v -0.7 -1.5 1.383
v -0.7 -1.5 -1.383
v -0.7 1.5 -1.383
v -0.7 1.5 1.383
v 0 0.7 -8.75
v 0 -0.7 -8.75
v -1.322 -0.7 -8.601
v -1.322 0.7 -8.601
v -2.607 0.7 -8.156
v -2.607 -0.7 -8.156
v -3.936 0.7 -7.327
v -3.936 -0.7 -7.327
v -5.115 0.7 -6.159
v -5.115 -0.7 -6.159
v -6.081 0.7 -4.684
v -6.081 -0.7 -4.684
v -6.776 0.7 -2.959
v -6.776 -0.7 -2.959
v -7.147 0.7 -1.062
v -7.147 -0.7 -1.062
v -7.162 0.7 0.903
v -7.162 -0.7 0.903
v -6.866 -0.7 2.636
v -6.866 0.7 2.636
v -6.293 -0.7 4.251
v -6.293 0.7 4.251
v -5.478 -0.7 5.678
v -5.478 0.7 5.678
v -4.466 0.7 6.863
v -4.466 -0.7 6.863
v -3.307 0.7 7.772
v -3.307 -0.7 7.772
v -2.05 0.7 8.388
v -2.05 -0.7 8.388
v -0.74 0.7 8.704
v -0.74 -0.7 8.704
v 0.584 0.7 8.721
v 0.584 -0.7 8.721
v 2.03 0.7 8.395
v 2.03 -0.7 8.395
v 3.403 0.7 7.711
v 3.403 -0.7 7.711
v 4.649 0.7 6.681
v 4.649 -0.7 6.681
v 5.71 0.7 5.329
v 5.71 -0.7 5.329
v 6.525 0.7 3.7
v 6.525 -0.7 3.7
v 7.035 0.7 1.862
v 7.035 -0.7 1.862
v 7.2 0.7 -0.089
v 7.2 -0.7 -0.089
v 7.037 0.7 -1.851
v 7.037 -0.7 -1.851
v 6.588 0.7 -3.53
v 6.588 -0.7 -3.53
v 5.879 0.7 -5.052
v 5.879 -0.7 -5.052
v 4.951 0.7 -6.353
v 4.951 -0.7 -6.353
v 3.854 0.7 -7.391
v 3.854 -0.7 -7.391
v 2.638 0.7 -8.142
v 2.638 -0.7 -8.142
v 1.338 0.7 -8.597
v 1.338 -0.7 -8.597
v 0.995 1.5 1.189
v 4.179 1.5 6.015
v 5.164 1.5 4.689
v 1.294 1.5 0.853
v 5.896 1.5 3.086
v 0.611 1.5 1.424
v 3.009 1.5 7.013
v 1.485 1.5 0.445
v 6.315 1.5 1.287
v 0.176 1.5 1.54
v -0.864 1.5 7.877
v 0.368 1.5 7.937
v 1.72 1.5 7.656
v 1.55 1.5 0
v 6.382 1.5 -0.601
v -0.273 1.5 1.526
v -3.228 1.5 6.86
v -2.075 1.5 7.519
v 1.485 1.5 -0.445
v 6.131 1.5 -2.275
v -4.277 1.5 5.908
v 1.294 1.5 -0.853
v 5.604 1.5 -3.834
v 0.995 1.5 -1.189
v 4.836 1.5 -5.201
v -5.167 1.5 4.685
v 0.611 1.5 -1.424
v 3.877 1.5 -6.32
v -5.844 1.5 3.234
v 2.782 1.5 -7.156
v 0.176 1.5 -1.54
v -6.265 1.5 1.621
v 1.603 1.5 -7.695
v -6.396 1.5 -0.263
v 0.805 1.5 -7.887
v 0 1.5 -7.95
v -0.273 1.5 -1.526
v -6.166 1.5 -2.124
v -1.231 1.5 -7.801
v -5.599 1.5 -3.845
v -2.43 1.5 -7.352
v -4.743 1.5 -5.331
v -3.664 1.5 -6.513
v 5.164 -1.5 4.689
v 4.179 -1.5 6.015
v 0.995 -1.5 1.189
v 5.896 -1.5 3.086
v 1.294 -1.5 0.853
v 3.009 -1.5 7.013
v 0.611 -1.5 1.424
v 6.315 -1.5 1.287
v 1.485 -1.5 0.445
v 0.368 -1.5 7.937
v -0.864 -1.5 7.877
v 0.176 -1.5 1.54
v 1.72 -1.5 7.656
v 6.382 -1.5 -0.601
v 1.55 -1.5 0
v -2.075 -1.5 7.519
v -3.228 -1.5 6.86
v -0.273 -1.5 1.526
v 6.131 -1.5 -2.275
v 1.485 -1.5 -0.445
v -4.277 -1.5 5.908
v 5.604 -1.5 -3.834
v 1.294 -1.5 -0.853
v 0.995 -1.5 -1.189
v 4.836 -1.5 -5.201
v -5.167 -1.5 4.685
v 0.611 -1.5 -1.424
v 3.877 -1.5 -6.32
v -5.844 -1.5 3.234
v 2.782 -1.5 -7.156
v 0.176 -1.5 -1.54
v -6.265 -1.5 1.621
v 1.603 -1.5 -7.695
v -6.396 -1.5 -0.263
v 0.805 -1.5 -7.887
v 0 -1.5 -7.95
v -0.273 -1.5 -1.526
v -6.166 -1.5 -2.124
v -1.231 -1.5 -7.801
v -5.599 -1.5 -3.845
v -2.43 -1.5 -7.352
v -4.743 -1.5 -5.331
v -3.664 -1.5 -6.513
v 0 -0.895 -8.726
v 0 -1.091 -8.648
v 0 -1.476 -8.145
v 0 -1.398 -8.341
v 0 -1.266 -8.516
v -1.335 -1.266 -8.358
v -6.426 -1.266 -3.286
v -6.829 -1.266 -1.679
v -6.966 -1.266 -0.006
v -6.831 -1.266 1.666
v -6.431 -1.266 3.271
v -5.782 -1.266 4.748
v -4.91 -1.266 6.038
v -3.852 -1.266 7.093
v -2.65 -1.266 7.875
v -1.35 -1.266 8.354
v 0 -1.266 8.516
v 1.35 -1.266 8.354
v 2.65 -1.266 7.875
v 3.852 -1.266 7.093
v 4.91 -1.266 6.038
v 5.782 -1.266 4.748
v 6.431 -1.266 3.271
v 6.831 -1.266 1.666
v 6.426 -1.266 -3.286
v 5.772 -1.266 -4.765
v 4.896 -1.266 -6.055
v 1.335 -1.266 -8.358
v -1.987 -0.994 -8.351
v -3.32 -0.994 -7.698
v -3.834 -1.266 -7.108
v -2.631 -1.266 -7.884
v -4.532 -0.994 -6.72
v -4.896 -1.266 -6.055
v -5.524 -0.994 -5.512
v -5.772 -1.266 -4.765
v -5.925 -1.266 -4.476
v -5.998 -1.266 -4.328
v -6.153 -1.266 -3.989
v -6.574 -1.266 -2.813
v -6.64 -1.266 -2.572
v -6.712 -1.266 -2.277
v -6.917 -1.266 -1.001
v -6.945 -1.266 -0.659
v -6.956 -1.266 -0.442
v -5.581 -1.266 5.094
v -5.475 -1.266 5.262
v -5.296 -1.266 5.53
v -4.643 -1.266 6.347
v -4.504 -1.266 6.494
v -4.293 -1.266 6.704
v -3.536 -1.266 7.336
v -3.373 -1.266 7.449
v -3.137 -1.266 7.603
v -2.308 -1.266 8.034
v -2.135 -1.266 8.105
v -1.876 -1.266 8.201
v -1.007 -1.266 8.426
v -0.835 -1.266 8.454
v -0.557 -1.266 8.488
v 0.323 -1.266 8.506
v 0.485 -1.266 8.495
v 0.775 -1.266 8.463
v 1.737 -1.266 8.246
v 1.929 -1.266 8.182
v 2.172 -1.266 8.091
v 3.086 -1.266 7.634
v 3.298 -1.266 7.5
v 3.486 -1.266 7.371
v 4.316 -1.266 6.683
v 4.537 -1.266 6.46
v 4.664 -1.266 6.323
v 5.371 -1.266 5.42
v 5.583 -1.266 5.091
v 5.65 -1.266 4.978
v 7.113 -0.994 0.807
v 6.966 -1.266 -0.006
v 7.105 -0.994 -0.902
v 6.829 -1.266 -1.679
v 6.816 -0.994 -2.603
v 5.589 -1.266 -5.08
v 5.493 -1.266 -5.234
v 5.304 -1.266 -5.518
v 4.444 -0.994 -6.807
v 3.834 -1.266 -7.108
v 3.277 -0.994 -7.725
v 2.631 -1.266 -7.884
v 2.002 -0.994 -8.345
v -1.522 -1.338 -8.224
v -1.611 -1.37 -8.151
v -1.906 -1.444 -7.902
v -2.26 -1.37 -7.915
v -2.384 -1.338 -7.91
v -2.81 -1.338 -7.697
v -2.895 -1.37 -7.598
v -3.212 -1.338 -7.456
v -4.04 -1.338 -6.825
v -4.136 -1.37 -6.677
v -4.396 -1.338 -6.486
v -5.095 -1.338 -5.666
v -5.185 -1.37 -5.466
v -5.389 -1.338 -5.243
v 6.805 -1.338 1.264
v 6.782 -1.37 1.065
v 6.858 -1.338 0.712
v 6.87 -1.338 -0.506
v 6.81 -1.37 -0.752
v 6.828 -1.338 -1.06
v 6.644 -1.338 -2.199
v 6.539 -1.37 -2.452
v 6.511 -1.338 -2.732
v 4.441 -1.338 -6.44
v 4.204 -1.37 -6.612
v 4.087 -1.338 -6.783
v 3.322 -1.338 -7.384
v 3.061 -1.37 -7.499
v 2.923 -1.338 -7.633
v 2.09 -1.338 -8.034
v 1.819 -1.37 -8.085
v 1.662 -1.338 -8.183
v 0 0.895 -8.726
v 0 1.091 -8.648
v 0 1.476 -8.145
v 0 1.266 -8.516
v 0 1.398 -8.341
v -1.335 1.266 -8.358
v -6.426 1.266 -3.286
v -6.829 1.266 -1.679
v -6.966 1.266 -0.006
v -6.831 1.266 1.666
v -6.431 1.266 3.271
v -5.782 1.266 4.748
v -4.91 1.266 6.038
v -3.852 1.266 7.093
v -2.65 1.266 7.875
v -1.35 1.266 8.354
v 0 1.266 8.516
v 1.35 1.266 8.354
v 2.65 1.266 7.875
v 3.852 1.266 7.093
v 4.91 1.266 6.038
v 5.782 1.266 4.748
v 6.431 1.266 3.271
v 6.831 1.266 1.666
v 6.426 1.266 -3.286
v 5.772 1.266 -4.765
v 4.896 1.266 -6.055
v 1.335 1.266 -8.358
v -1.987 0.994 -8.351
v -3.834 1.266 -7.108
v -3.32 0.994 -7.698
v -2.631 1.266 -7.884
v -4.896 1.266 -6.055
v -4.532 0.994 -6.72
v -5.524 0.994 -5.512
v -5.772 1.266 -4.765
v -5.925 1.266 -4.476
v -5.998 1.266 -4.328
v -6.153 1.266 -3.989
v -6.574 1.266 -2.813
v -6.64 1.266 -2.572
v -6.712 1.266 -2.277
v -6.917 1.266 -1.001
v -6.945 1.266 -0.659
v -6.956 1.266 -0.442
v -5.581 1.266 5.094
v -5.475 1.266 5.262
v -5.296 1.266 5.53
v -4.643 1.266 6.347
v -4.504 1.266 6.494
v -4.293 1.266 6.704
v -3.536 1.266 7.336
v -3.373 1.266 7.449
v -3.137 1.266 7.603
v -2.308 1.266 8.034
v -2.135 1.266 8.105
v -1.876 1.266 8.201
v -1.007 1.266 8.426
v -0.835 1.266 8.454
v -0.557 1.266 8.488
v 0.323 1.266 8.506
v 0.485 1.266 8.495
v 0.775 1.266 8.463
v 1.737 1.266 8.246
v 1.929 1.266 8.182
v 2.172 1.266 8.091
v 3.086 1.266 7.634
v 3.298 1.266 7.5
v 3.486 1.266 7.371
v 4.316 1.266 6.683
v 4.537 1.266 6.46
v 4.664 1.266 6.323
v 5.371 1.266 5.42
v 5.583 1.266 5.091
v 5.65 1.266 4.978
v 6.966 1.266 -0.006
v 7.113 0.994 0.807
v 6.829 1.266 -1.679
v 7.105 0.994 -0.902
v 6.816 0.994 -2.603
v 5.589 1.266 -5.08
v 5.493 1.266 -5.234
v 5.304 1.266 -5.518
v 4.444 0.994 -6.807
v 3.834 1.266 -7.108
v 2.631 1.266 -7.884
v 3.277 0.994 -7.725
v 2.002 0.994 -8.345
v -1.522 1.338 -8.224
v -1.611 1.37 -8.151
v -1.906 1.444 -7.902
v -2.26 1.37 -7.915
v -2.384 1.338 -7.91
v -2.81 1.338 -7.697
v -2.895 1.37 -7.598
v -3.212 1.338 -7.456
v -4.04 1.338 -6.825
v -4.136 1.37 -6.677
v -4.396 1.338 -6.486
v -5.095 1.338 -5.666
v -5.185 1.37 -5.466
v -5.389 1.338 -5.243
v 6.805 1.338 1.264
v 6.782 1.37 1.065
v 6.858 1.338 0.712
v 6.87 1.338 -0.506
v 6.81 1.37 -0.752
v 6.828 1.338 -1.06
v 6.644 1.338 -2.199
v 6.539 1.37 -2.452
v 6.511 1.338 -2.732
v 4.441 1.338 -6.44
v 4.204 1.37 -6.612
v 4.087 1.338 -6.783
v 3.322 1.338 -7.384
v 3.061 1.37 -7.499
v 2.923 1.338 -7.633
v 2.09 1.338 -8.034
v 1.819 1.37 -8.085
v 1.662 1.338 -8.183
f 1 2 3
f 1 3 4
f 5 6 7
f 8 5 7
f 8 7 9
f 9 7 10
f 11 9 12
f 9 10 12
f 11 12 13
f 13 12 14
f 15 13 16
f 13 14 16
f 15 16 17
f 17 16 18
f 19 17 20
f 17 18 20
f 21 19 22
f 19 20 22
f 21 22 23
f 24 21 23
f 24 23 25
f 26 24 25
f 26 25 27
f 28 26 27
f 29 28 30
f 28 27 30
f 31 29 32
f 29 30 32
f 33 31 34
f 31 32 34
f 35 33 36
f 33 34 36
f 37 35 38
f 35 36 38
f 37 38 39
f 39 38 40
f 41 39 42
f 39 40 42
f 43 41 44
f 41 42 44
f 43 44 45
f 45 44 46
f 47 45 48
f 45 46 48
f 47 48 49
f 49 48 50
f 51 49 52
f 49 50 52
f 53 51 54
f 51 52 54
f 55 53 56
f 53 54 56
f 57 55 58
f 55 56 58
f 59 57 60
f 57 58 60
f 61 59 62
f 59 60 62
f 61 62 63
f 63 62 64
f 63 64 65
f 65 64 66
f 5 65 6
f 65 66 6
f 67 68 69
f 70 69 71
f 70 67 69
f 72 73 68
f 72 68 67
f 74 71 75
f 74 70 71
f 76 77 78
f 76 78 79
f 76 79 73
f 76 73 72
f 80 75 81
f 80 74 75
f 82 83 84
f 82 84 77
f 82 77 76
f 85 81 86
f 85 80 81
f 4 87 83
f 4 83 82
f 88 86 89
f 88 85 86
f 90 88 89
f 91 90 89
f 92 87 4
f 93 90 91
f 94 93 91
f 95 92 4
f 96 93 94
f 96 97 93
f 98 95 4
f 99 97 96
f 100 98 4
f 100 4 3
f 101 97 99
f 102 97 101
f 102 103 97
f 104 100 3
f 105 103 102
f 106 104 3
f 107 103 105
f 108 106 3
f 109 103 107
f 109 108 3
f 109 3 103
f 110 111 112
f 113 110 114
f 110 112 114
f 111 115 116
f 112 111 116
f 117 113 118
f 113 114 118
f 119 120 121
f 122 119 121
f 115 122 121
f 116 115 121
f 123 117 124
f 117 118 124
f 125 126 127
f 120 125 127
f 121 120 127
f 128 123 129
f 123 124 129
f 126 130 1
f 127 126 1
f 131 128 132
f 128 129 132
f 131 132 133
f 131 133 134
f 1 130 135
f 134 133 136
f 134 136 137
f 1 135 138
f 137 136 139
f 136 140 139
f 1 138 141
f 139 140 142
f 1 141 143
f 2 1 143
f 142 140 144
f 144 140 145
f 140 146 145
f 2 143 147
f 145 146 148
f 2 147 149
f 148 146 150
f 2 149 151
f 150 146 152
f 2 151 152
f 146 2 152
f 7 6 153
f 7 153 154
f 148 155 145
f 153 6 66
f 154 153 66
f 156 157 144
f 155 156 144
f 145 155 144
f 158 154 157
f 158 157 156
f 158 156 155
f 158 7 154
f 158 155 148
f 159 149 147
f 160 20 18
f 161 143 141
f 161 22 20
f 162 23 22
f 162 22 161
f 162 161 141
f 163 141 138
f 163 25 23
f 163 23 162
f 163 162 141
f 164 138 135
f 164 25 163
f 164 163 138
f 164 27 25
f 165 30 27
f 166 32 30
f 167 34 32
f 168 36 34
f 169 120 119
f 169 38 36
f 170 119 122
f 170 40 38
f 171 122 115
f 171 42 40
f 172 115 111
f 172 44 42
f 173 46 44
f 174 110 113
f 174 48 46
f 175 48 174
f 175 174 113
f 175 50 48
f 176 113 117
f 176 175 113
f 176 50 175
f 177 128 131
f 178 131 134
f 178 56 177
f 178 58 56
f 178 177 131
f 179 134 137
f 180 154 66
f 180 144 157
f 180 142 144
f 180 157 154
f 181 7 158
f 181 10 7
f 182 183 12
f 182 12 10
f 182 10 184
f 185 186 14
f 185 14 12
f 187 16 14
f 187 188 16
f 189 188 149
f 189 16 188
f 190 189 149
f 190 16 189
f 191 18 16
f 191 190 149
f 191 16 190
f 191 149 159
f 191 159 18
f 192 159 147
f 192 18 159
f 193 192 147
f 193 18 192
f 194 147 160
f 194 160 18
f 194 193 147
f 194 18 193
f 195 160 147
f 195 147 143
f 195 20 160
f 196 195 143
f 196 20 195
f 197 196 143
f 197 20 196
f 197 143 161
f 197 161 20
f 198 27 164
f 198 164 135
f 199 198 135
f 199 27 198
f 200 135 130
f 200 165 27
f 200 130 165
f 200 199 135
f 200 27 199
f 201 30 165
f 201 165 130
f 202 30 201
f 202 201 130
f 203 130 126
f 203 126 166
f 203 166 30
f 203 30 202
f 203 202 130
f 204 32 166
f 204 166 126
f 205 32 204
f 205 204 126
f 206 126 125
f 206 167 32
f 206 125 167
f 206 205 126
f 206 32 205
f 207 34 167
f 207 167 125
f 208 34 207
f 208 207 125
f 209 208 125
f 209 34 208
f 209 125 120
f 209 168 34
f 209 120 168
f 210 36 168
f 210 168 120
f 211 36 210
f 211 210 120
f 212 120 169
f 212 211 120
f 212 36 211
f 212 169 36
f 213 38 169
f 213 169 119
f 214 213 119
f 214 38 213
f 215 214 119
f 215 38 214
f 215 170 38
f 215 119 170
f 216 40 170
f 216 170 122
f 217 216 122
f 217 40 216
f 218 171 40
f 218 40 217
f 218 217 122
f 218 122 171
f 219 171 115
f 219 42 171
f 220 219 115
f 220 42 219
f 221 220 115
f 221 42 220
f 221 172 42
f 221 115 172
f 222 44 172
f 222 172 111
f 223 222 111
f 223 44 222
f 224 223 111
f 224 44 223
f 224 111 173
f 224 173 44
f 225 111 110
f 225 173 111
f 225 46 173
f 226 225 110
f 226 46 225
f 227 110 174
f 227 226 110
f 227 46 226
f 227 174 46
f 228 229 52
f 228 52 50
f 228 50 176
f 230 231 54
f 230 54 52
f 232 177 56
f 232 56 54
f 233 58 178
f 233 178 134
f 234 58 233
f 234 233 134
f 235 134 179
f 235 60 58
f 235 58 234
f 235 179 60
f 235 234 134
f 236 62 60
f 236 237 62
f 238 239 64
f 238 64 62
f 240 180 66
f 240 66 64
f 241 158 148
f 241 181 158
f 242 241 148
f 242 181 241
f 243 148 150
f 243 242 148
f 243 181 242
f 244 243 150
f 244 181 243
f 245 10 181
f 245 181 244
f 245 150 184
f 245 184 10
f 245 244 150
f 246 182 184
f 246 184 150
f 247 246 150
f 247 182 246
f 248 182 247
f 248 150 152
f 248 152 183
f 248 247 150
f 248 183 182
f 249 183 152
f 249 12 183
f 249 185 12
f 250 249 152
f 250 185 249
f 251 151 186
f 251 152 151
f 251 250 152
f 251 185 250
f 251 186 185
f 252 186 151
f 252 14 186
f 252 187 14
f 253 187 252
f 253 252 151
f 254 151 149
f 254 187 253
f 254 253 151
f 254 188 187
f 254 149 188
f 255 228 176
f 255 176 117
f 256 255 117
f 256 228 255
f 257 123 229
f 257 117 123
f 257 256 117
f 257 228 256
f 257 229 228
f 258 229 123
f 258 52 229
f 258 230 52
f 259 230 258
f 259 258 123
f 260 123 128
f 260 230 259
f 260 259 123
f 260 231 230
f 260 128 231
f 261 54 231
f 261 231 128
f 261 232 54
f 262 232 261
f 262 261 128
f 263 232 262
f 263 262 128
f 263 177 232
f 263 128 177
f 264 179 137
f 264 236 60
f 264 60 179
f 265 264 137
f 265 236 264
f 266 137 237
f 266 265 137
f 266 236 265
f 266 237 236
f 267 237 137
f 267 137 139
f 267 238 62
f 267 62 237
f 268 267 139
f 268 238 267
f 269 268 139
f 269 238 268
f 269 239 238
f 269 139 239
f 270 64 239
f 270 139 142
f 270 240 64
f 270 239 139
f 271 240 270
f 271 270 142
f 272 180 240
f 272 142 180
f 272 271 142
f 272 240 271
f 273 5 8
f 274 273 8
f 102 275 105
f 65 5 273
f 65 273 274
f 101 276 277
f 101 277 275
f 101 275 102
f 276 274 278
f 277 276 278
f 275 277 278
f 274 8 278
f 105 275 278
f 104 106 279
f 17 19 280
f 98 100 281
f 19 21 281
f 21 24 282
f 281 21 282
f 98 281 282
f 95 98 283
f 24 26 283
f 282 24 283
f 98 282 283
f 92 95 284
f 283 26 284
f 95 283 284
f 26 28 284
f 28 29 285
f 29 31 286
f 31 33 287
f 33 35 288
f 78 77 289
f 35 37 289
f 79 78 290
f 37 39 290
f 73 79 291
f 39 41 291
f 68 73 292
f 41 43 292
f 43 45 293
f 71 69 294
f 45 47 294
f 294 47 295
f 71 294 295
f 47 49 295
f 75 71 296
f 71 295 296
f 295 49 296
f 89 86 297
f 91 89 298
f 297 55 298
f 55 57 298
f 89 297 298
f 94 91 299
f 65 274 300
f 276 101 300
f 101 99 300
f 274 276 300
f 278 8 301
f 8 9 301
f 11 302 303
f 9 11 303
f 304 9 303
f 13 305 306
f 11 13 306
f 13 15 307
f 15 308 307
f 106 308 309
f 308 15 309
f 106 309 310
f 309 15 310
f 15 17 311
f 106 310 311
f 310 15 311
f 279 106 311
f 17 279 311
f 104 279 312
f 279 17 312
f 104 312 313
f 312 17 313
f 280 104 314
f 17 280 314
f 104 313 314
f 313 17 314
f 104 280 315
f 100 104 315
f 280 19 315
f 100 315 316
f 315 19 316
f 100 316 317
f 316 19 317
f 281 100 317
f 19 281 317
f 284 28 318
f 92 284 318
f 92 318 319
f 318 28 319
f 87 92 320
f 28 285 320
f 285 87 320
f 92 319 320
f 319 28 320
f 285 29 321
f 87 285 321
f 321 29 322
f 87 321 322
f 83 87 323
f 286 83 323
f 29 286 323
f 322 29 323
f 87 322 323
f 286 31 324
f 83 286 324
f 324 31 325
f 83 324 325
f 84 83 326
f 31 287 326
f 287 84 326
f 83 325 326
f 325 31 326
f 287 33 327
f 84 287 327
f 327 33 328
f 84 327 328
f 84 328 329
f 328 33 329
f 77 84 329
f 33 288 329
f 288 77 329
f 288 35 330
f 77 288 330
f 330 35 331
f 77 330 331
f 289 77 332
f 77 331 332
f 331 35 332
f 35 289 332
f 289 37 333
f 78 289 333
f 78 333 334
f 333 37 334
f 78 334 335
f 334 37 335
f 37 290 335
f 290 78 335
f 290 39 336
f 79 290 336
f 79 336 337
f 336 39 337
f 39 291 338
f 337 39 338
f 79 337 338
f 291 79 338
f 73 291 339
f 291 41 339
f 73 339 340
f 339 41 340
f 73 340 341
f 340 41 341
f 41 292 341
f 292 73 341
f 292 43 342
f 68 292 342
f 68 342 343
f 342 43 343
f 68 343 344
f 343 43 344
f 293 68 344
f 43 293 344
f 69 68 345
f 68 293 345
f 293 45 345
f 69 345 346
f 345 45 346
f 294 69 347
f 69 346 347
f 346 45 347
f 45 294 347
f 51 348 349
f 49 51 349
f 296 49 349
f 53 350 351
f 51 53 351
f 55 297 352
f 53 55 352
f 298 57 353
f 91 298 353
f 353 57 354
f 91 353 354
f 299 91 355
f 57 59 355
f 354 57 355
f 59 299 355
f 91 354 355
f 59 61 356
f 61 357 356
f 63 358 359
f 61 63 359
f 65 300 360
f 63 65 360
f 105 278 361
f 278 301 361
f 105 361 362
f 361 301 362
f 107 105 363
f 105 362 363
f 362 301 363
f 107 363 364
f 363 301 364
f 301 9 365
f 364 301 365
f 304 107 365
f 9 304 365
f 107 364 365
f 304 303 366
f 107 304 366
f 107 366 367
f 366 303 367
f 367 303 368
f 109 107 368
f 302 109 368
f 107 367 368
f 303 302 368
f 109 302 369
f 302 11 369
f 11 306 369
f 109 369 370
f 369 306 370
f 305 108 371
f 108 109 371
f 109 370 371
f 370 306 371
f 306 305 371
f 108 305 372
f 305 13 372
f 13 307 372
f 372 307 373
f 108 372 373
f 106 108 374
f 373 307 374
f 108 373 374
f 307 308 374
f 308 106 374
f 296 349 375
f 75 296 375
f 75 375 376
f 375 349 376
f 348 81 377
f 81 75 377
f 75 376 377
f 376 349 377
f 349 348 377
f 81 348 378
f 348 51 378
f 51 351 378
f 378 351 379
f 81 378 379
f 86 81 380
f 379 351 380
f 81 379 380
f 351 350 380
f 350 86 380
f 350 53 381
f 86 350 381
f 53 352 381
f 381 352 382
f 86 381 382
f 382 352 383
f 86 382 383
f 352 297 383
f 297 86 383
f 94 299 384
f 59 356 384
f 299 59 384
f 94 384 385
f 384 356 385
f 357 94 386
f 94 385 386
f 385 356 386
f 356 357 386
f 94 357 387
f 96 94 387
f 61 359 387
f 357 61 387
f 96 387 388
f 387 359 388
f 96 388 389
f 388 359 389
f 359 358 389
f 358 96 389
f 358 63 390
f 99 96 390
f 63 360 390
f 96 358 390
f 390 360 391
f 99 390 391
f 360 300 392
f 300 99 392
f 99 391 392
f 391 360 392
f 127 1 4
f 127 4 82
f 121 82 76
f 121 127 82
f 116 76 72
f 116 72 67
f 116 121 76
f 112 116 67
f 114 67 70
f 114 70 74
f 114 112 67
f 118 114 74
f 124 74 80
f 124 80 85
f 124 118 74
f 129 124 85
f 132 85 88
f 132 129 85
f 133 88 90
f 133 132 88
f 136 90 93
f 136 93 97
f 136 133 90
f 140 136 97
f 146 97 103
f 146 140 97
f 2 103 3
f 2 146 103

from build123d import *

# Parameters (mm, degrees)
BOSS_EXTRUDE1_DEPTH      = 1.5
BOSS_EXTRUDE1_DEPTH_BACK = 1.5
SKETCH1_RX               = 8.75
SKETCH1_RY               = 7.2
FILLET1_R                = 0.8


with BuildPart() as part:
    # Sketch1 → Boss-Extrude1 (new, two sides: drawn at the far end of the back side and taken through both)
    with BuildSketch(Plane(origin=(0, 0, 0), x_dir=(1, 0, 0), z_dir=(0, 1, 0)).offset(-BOSS_EXTRUDE1_DEPTH_BACK)):
        with Locations(Location((0, 0), (0, 0, 90))):
            Ellipse(SKETCH1_RX, SKETCH1_RY)
        with BuildLine():
            Line((-0.7, 1.382931669), (-0.7, -1.382931669))
            ThreePointArc((-0.7, -1.382931669), (1.55, 0), (-0.7, 1.382931669))
        make_face(mode=Mode.SUBTRACT)
    extrude(amount=BOSS_EXTRUDE1_DEPTH + BOSS_EXTRUDE1_DEPTH_BACK)

    # Fillet1
    fillet1_edges = [part.edges().sort_by_distance(p)[0] for p in [
        (0.000739081, 1.5, 8.749999954),
        (0.000739081, -1.5, 8.749999954),
    ]]
    fillet(fillet1_edges, radius=FILLET1_R)


solid = part.part
